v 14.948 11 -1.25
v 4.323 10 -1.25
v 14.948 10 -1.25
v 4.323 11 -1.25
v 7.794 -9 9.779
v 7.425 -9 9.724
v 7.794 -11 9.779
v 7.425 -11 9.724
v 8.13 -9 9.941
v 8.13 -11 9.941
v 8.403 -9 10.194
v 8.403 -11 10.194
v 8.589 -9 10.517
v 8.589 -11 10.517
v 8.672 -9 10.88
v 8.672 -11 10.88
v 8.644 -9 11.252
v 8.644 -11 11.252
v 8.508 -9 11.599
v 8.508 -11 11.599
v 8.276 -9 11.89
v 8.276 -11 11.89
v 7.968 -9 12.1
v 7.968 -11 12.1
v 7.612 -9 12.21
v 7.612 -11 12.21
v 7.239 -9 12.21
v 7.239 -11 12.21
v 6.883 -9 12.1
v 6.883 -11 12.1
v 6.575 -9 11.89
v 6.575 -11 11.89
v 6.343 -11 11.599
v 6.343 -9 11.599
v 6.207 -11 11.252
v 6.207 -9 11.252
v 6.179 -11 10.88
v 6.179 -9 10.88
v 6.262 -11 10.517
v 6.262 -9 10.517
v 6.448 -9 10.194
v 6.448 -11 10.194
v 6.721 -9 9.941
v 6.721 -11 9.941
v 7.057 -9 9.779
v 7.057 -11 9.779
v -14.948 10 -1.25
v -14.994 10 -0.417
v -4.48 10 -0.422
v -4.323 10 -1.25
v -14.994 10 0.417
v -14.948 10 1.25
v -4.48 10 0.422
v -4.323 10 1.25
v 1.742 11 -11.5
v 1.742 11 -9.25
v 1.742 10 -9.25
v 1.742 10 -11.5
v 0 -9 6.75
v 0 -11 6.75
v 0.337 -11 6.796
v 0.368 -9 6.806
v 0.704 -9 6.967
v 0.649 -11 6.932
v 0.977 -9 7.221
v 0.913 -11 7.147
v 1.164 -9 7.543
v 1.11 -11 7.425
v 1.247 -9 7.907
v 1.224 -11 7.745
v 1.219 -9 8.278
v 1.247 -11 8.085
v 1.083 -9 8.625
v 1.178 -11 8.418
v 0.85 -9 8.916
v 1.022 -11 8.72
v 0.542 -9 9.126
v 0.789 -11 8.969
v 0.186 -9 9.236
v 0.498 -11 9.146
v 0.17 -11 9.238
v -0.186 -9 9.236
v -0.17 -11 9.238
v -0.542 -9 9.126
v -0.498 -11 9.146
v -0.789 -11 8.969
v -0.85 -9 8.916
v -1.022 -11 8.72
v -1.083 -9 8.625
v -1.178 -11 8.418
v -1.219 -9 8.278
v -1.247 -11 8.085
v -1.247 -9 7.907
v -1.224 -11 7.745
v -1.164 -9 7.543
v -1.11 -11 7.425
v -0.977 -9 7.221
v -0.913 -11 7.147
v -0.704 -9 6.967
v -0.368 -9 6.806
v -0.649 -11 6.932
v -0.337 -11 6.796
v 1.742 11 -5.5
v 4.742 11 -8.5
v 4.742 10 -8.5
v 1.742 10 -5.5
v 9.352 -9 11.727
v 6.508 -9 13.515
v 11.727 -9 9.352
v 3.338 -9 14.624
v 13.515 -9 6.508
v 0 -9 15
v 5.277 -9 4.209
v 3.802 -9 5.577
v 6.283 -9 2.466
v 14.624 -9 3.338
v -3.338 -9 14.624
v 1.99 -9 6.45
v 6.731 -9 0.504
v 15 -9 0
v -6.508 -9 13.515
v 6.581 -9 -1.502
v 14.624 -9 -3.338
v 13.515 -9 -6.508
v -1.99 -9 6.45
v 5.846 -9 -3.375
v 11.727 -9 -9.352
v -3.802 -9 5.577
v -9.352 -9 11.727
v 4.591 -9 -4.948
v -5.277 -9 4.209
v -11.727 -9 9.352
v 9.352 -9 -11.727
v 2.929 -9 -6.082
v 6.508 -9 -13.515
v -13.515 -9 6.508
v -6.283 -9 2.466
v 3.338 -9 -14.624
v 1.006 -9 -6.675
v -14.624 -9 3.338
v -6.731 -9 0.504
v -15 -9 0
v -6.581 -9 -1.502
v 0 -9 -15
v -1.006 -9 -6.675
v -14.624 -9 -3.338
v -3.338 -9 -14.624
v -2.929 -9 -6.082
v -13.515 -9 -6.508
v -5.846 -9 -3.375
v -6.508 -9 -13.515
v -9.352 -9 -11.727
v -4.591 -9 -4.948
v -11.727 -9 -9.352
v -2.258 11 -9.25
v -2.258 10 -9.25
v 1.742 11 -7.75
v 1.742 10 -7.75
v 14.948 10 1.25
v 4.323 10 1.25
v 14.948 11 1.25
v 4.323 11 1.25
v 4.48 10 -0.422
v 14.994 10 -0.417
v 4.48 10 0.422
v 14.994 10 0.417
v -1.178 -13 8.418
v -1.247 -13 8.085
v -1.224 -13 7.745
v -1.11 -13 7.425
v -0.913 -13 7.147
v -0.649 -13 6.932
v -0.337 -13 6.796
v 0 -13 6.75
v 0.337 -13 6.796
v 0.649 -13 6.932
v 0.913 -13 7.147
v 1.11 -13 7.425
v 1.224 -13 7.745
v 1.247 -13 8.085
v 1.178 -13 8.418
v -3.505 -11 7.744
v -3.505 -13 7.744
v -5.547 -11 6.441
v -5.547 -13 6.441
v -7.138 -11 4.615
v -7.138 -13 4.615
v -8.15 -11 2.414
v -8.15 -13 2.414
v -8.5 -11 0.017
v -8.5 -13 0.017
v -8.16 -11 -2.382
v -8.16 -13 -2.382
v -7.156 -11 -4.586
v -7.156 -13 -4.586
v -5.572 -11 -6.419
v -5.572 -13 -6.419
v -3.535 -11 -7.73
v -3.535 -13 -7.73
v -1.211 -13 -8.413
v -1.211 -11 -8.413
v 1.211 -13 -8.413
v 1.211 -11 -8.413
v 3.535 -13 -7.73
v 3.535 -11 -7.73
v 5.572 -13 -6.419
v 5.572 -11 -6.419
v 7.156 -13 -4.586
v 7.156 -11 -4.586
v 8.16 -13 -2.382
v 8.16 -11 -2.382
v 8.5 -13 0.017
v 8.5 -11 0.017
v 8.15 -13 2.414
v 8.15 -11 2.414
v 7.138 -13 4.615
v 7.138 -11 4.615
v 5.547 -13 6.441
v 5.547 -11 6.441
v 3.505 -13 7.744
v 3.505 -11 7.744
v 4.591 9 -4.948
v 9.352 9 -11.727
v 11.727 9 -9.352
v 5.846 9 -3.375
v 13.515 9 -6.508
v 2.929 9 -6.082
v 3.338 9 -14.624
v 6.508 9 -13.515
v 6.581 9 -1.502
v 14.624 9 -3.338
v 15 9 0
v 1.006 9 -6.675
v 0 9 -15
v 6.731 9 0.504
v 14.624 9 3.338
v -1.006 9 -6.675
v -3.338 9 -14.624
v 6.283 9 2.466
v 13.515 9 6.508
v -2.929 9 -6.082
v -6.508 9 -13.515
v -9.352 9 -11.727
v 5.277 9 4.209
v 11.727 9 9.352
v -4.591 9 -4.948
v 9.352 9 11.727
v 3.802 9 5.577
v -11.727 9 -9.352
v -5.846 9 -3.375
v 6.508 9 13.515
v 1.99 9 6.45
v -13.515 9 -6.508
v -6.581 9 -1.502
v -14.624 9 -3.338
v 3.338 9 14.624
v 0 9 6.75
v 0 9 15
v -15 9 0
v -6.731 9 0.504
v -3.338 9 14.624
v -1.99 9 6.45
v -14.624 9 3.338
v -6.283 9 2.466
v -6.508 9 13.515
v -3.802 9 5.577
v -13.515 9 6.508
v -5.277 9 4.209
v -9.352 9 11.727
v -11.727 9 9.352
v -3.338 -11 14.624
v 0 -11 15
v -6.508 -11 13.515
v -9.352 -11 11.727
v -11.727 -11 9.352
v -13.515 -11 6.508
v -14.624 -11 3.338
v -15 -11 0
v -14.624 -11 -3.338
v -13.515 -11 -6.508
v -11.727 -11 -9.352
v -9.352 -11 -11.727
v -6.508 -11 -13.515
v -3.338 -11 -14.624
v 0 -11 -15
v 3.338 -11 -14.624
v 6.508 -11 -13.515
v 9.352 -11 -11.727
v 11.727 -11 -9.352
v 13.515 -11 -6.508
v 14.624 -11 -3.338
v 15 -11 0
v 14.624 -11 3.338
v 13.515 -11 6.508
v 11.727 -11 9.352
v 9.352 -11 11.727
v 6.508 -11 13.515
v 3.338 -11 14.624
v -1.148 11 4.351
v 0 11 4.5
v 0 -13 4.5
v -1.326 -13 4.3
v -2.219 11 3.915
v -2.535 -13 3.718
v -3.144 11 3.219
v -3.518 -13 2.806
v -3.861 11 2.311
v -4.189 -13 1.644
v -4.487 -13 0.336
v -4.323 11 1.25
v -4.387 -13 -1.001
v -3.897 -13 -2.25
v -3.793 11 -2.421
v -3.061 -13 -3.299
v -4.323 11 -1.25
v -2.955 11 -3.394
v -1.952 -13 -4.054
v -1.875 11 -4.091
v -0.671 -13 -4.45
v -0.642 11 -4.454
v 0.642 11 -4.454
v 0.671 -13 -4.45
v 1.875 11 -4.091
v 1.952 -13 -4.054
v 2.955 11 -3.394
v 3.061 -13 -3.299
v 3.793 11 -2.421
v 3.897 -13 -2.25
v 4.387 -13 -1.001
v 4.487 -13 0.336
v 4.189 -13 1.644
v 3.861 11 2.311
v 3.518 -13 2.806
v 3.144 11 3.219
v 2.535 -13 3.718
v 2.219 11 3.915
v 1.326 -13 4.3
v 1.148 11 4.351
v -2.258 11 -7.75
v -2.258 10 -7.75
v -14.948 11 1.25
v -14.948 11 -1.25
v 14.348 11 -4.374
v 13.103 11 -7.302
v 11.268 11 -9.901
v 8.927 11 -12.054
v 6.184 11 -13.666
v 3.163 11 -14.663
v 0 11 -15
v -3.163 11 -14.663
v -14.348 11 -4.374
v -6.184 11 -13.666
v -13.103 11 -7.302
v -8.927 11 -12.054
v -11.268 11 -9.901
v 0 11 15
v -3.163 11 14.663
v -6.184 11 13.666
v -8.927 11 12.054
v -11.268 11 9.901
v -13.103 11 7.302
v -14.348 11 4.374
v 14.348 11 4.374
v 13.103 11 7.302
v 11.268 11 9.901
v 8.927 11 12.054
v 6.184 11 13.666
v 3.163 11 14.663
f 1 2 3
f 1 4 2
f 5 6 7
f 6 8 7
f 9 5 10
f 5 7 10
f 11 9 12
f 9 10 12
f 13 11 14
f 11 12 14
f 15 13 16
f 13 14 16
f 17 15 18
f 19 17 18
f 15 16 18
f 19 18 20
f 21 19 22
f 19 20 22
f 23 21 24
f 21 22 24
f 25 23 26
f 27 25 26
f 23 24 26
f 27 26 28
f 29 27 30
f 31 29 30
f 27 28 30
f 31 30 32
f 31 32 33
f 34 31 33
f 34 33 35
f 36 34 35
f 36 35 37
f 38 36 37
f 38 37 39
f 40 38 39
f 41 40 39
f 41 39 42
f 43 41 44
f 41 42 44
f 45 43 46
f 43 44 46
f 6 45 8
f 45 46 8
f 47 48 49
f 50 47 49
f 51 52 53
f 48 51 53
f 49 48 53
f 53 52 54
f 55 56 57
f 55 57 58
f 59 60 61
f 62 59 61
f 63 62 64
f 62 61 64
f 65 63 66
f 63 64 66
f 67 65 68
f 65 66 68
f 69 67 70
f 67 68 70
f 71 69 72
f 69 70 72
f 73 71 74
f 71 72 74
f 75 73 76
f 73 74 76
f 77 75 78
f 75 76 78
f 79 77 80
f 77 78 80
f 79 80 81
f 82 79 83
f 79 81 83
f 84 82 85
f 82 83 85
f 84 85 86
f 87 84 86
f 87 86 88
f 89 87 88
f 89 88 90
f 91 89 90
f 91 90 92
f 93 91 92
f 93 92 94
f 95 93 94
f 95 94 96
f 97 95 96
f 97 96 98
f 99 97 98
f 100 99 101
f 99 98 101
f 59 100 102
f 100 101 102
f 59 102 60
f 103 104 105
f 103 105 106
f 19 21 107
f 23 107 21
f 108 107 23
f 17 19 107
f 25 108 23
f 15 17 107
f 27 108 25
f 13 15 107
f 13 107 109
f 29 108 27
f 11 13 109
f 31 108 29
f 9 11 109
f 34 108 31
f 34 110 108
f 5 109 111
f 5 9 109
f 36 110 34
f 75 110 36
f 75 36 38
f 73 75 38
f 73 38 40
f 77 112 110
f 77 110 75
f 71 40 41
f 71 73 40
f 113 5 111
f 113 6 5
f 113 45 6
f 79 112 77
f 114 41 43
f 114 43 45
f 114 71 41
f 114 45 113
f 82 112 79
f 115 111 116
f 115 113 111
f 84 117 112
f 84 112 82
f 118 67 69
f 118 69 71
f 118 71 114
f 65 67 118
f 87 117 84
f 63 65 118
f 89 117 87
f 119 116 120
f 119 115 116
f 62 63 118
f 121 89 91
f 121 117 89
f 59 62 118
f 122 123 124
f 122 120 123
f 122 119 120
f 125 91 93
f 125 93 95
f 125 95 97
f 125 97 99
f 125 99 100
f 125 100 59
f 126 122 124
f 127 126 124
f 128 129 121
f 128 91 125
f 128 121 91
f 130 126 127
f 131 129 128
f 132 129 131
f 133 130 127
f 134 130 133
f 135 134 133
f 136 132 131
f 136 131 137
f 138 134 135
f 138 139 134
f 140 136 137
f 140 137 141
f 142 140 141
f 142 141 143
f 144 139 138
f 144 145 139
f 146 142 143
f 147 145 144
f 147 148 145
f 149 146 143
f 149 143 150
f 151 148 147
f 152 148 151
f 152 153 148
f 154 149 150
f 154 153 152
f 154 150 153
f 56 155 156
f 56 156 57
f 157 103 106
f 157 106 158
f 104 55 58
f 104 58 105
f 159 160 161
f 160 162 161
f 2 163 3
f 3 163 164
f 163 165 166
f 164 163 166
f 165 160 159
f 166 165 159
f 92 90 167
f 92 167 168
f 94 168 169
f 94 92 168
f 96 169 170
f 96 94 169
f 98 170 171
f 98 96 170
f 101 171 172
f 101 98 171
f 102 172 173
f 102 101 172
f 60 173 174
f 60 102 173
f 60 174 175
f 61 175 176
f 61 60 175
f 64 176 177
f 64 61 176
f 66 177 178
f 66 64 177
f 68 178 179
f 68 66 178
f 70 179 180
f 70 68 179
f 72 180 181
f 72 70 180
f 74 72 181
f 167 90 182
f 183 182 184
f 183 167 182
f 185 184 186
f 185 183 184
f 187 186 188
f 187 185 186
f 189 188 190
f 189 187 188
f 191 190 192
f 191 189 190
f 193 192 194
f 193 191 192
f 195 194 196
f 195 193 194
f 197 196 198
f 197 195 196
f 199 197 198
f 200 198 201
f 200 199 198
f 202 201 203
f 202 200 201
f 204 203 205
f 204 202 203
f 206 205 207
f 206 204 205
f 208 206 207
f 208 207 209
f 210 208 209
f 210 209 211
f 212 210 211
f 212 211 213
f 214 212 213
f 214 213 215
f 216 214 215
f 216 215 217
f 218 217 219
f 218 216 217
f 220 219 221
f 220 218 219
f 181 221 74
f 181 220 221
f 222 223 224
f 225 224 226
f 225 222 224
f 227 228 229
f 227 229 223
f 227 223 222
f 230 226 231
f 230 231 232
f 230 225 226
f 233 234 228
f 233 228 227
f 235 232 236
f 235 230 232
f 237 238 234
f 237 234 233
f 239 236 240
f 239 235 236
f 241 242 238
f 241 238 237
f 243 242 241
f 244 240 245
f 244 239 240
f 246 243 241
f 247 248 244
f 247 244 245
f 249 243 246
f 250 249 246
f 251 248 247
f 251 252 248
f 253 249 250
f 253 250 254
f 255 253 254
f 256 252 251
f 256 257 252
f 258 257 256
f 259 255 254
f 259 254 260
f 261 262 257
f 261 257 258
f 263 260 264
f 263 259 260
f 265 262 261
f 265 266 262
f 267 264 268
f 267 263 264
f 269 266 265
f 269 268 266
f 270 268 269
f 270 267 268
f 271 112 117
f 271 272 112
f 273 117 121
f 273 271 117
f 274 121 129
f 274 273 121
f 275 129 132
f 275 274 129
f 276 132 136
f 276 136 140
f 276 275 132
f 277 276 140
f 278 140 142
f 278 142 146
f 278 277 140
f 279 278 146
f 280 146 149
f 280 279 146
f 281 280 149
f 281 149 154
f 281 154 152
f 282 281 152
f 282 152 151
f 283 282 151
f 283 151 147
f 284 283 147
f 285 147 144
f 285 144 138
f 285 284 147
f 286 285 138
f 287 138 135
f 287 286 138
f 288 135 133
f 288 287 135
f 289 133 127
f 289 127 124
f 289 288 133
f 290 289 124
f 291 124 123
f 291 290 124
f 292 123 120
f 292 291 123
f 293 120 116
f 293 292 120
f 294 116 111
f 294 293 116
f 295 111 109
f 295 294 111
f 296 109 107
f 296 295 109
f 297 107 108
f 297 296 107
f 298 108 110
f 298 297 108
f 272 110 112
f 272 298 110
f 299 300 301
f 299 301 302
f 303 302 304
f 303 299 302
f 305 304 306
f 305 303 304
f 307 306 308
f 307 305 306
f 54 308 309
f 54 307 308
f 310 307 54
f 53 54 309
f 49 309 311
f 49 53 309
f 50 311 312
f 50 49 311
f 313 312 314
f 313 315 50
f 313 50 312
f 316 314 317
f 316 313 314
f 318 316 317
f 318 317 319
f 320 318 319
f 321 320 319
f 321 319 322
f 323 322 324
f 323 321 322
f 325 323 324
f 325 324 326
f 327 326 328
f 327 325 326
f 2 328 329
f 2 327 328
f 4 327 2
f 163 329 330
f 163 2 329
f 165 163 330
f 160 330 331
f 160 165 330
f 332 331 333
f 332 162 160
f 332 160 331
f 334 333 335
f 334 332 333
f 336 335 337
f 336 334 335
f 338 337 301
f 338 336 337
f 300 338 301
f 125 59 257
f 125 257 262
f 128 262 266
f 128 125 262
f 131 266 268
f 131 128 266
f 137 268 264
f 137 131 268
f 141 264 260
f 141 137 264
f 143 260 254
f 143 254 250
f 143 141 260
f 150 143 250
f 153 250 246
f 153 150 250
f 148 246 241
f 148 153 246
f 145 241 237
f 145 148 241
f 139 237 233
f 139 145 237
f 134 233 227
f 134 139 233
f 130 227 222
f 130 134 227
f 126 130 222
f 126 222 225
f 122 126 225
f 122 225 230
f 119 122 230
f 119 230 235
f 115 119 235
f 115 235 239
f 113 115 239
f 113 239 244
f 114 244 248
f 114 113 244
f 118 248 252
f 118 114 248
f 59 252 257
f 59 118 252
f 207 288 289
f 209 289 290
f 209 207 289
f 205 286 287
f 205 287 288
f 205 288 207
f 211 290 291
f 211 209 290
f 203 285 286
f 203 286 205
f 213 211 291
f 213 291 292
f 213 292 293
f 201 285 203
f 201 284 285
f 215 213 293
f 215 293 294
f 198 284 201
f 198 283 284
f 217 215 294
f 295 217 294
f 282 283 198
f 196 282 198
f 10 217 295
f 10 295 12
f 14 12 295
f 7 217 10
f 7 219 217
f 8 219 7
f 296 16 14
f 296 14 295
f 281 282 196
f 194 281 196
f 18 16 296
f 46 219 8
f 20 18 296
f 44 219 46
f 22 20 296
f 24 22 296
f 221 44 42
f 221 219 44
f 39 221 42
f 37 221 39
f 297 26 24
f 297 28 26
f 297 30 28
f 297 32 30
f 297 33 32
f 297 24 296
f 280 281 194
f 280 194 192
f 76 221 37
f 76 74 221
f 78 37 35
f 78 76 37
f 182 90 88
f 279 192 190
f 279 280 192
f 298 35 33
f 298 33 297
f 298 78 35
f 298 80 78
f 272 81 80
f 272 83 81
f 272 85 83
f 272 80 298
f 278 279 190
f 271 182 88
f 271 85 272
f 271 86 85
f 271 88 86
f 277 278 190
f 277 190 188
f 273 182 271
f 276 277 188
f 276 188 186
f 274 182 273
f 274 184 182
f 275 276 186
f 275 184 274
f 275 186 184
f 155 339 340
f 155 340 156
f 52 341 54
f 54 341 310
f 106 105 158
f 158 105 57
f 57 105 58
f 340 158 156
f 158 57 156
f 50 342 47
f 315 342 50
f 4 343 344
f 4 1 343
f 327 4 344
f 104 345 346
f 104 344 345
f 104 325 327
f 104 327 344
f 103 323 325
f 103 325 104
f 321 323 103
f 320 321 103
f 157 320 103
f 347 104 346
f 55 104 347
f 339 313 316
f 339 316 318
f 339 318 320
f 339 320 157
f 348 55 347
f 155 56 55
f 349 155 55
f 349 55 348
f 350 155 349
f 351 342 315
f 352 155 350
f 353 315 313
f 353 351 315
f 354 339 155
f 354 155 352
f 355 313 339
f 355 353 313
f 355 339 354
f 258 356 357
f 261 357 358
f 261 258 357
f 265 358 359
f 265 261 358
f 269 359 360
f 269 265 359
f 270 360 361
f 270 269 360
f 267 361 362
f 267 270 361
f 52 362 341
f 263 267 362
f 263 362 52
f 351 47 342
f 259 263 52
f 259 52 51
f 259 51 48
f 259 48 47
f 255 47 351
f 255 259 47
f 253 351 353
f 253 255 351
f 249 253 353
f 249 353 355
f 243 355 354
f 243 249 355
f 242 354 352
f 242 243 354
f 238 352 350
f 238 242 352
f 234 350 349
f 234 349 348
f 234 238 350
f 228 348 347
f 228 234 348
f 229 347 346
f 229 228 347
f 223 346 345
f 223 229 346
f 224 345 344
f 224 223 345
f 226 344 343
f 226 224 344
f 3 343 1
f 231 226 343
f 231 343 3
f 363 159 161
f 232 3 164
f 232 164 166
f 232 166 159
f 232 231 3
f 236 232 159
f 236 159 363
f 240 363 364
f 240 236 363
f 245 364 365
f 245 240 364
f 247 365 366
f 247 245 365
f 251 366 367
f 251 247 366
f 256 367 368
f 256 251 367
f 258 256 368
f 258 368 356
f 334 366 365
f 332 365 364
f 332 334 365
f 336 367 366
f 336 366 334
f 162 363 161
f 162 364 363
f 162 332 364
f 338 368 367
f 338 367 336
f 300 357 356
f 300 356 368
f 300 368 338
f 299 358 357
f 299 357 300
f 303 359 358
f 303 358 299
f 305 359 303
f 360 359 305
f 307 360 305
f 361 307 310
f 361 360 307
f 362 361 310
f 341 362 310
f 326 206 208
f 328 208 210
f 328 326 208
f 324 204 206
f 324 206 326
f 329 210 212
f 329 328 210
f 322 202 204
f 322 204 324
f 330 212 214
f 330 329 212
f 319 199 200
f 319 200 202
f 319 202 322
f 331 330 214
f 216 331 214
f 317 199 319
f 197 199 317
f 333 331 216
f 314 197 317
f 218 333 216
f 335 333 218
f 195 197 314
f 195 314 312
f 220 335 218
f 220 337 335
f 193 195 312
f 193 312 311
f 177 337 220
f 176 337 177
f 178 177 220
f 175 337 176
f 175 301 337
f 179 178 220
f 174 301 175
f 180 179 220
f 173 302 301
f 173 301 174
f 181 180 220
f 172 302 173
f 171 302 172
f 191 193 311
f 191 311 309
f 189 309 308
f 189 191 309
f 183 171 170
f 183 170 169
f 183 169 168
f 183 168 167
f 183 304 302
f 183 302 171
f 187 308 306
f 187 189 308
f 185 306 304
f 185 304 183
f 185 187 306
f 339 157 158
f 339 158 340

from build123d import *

# Parameters (mm, degrees)
CUT_EXTRUDE2_DEPTH      = 1
CUT_EXTRUDE3_DEPTH      = 17
CUT_EXTRUDE3_DEPTH_BACK = 1
CUT_EXTRUDE3_START      = -40
SKETCH5_W               = 42.611665196
SKETCH5_H               = 2.5
SKETCH3_R               = 1.25
CUT_EXTRUDE1_DEPTH      = 9.5


with BuildPart() as part:
    # Sketch2 → Revolve1 (revolve)
    with BuildSketch(Plane(origin=(0, 0, 0), x_dir=(0, 0, -1), z_dir=(1, 0, 0))):
        Polygon((-15, 11), (-15, 9), (-6.75, 9), (-6.75, -9), (-15, -9), (-15, -11), (-8.5, -11), (-8.5, -13), (-4.5, -13), (-4.5, -12), (-4.5, 11), align=None)
    revolve(axis=Axis((0, 15.5, 0), (0, -1, 0)))

    # Sketch4 → Cut-Extrude2 (cut)
    with BuildSketch(Plane(origin=(0, 11, 0), x_dir=(1, 0, 0), z_dir=(0, 1, 0))):
        Polygon((-2.25827734, 9.25), (1.74172266, 9.25), (1.74172266, 11.500000233), (4.74172266, 8.5), (1.74172266, 5.500000233), (1.74172266, 7.75), (-2.25827734, 7.75), align=None)
    extrude(amount=-CUT_EXTRUDE2_DEPTH, mode=Mode.SUBTRACT)

    # Sketch5 → Cut-Extrude3 (cut, two sides: drawn at the far end of the back side and taken through both)
    with BuildSketch(Plane.XZ.offset(13).offset(CUT_EXTRUDE3_START - CUT_EXTRUDE3_DEPTH_BACK)):
        Rectangle(SKETCH5_W, SKETCH5_H)
    extrude(amount=CUT_EXTRUDE3_DEPTH + CUT_EXTRUDE3_DEPTH_BACK, mode=Mode.SUBTRACT)

    # Sketch3 → Cut-Extrude1 (cut, symmetric)
    with BuildSketch(Plane.XZ.offset(11)):
        with Locations(Location((0, 8, 0), (0, 0, 270))):
            Circle(SKETCH3_R)
        with Locations(Location((7.425425002, 10.973858189, 0), (0, 0, 270))):
            Circle(SKETCH3_R)
    extrude(amount=CUT_EXTRUDE1_DEPTH, both=True, mode=Mode.SUBTRACT)


solid = part.part
